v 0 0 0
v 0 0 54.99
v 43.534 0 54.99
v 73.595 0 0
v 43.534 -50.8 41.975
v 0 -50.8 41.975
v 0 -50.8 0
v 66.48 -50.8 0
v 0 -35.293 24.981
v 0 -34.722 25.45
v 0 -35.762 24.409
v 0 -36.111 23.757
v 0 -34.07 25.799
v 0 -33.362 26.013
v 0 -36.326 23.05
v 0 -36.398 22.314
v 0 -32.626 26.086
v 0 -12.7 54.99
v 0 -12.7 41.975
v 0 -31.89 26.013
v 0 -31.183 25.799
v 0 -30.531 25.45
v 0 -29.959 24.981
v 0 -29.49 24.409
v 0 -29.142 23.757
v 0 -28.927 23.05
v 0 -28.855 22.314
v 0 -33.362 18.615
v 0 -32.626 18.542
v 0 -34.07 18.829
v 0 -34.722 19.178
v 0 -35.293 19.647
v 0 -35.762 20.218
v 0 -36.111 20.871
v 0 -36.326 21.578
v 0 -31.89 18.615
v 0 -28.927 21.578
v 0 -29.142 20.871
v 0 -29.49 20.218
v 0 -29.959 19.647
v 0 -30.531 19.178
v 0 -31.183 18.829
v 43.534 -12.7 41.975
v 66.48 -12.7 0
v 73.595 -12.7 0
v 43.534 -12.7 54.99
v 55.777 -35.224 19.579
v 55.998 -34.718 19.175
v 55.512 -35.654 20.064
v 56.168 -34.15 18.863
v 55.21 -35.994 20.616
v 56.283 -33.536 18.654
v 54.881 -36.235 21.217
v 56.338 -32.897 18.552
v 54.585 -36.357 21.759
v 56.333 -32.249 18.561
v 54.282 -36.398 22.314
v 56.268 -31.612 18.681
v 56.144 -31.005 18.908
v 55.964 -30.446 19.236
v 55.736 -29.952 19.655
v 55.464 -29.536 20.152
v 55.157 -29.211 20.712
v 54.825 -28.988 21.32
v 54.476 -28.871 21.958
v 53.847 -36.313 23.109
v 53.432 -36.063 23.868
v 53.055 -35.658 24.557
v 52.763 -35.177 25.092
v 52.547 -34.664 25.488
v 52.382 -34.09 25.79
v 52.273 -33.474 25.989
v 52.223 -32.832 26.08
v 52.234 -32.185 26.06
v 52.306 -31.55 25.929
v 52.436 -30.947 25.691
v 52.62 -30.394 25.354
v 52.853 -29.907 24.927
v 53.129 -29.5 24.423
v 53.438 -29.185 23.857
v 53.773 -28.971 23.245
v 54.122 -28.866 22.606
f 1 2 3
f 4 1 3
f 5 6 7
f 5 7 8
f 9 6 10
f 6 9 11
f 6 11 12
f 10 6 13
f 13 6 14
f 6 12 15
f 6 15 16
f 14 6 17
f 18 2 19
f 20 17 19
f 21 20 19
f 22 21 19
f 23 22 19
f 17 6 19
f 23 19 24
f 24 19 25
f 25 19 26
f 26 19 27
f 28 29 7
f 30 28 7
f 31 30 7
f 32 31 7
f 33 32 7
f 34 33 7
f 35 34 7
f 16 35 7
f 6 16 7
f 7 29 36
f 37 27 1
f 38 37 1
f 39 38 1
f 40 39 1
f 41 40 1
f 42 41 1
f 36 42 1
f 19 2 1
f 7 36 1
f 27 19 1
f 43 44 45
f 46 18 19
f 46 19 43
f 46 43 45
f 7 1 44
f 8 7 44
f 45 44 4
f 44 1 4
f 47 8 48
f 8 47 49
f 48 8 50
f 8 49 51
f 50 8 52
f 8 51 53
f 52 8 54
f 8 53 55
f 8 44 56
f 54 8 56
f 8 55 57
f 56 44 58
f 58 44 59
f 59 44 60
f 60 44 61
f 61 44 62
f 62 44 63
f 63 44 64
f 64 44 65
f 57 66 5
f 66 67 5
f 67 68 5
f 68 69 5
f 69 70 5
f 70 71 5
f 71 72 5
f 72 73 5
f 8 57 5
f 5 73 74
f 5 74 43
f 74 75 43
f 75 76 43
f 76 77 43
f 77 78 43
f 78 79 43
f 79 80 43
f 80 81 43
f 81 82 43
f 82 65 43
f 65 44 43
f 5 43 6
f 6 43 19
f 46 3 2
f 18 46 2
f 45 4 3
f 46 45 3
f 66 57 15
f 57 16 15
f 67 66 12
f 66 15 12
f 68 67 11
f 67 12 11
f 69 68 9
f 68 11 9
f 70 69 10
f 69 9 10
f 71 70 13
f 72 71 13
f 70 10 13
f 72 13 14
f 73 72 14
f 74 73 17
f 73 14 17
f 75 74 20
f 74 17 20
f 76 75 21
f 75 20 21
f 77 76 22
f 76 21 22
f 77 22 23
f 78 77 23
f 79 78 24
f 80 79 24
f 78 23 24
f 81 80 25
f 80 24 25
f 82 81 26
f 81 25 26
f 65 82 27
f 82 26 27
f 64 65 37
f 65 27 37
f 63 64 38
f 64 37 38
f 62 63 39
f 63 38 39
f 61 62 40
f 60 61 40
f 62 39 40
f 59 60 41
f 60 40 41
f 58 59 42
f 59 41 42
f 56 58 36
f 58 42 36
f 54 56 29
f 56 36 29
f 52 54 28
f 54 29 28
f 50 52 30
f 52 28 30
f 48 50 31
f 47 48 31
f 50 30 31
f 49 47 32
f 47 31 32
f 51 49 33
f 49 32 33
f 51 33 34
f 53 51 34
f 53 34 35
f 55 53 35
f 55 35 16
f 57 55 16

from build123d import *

# Parameters (mm, degrees)
F1_DEPTH = 50.8
F2_DEPTH = 12.7
F3_R     = 3.771706
F4_DEPTH = 127


with BuildPart() as f1:
    # F0 (on Front) → F1 (new body)
    with BuildSketch(Plane.XZ):
        Polygon((43.533504, 41.975465), (0, 41.975465), (0, 0), (66.480095, 0), align=None)
    extrude(amount=F1_DEPTH)

    # F0 (on Front) → F2 (join)
    with BuildSketch(Plane.XZ):
        Polygon((43.533504, 54.989692), (0, 54.989692), (0, 41.975465), (43.533504, 41.975465), (66.480095, 0), (73.59454, 0), align=None)
    extrude(amount=F2_DEPTH)

    # F3 (on face) → F4 (cut, symmetric)
    with BuildSketch(Plane(origin=(0, 0, 0), x_dir=(0, -1, 0), z_dir=(-1, 0, 0))):
        with Locations((32.626301, 22.3139)):
            Circle(F3_R)
    extrude(amount=F4_DEPTH, both=True, mode=Mode.SUBTRACT)


solid = f1.part
